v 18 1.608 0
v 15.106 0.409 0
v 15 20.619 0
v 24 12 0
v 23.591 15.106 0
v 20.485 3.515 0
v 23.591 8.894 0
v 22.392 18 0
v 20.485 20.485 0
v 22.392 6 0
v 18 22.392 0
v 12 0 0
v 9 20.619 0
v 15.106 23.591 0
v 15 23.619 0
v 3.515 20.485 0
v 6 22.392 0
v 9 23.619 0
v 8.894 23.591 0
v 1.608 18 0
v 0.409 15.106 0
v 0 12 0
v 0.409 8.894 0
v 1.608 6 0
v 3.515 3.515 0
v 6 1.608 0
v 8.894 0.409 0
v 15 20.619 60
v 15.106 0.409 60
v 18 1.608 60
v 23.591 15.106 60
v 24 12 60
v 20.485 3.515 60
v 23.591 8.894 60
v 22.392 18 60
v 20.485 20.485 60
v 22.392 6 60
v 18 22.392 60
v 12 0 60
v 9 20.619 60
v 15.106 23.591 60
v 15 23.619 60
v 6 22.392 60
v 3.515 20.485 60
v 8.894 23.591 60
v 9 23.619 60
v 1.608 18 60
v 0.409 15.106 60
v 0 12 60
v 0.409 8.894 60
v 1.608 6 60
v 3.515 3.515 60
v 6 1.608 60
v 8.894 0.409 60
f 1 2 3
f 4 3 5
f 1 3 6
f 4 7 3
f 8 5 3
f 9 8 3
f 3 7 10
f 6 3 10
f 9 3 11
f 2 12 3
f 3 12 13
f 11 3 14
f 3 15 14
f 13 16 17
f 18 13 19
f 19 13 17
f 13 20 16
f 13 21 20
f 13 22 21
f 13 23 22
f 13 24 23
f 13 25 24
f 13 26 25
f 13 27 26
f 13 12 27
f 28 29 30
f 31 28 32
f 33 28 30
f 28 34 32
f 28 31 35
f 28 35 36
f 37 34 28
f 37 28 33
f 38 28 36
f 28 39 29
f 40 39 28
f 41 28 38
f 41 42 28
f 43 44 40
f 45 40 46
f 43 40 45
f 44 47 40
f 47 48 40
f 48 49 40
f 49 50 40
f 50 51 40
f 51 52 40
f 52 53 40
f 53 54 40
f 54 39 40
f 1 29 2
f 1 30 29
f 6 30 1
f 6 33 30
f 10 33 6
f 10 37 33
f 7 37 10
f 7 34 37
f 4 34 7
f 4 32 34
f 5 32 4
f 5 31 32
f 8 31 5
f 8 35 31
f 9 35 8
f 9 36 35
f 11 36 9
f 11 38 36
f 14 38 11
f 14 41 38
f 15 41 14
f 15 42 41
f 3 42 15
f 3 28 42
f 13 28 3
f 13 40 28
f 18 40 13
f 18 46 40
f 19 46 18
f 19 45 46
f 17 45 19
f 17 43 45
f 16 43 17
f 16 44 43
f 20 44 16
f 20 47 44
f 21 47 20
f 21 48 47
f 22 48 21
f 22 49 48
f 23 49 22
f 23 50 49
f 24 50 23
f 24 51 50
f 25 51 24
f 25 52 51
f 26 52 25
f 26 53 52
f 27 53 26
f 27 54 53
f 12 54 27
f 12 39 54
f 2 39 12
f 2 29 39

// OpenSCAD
$fn = 32;

// ----------------------------------------------------------------------
// Keyway shaft: d24 shaft, key 6 x 3 mm
// ----------------------------------------------------------------------

// --- parameters (mm) ---
shaft_r = 12;             // shaft radius
key_w = 6;                // keyway width
key_d = 3;                // keyway depth below the surface line
plate_t = 60;             // shaft length, Z (extrusion height)

shaft_d = 2 * shaft_r;  // shaft diameter
circle_step = 15;  // polygon sampling step, degrees

profile = [[8.894, 23.591], [6, 22.392], [3.515, 20.485], [1.608, 18], [0.409, 15.106], [0, 12], [0.409, 8.894], [1.608, 6], [3.515, 3.515], [6, 1.608], [8.894, 0.409], [12, 0], [15.106, 0.409], [18, 1.608], [20.485, 3.515], [22.392, 6], [23.591, 8.894], [24, 12], [23.591, 15.106], [22.392, 18], [20.485, 20.485], [18, 22.392], [15.106, 23.591], [15, 23.619], [15, 20.619], [9, 20.619], [9, 23.619]];  // primary outline, 27 points, counter clockwise

// --- the one profile operation ---
linear_extrude(height = plate_t) polygon(points = profile);
